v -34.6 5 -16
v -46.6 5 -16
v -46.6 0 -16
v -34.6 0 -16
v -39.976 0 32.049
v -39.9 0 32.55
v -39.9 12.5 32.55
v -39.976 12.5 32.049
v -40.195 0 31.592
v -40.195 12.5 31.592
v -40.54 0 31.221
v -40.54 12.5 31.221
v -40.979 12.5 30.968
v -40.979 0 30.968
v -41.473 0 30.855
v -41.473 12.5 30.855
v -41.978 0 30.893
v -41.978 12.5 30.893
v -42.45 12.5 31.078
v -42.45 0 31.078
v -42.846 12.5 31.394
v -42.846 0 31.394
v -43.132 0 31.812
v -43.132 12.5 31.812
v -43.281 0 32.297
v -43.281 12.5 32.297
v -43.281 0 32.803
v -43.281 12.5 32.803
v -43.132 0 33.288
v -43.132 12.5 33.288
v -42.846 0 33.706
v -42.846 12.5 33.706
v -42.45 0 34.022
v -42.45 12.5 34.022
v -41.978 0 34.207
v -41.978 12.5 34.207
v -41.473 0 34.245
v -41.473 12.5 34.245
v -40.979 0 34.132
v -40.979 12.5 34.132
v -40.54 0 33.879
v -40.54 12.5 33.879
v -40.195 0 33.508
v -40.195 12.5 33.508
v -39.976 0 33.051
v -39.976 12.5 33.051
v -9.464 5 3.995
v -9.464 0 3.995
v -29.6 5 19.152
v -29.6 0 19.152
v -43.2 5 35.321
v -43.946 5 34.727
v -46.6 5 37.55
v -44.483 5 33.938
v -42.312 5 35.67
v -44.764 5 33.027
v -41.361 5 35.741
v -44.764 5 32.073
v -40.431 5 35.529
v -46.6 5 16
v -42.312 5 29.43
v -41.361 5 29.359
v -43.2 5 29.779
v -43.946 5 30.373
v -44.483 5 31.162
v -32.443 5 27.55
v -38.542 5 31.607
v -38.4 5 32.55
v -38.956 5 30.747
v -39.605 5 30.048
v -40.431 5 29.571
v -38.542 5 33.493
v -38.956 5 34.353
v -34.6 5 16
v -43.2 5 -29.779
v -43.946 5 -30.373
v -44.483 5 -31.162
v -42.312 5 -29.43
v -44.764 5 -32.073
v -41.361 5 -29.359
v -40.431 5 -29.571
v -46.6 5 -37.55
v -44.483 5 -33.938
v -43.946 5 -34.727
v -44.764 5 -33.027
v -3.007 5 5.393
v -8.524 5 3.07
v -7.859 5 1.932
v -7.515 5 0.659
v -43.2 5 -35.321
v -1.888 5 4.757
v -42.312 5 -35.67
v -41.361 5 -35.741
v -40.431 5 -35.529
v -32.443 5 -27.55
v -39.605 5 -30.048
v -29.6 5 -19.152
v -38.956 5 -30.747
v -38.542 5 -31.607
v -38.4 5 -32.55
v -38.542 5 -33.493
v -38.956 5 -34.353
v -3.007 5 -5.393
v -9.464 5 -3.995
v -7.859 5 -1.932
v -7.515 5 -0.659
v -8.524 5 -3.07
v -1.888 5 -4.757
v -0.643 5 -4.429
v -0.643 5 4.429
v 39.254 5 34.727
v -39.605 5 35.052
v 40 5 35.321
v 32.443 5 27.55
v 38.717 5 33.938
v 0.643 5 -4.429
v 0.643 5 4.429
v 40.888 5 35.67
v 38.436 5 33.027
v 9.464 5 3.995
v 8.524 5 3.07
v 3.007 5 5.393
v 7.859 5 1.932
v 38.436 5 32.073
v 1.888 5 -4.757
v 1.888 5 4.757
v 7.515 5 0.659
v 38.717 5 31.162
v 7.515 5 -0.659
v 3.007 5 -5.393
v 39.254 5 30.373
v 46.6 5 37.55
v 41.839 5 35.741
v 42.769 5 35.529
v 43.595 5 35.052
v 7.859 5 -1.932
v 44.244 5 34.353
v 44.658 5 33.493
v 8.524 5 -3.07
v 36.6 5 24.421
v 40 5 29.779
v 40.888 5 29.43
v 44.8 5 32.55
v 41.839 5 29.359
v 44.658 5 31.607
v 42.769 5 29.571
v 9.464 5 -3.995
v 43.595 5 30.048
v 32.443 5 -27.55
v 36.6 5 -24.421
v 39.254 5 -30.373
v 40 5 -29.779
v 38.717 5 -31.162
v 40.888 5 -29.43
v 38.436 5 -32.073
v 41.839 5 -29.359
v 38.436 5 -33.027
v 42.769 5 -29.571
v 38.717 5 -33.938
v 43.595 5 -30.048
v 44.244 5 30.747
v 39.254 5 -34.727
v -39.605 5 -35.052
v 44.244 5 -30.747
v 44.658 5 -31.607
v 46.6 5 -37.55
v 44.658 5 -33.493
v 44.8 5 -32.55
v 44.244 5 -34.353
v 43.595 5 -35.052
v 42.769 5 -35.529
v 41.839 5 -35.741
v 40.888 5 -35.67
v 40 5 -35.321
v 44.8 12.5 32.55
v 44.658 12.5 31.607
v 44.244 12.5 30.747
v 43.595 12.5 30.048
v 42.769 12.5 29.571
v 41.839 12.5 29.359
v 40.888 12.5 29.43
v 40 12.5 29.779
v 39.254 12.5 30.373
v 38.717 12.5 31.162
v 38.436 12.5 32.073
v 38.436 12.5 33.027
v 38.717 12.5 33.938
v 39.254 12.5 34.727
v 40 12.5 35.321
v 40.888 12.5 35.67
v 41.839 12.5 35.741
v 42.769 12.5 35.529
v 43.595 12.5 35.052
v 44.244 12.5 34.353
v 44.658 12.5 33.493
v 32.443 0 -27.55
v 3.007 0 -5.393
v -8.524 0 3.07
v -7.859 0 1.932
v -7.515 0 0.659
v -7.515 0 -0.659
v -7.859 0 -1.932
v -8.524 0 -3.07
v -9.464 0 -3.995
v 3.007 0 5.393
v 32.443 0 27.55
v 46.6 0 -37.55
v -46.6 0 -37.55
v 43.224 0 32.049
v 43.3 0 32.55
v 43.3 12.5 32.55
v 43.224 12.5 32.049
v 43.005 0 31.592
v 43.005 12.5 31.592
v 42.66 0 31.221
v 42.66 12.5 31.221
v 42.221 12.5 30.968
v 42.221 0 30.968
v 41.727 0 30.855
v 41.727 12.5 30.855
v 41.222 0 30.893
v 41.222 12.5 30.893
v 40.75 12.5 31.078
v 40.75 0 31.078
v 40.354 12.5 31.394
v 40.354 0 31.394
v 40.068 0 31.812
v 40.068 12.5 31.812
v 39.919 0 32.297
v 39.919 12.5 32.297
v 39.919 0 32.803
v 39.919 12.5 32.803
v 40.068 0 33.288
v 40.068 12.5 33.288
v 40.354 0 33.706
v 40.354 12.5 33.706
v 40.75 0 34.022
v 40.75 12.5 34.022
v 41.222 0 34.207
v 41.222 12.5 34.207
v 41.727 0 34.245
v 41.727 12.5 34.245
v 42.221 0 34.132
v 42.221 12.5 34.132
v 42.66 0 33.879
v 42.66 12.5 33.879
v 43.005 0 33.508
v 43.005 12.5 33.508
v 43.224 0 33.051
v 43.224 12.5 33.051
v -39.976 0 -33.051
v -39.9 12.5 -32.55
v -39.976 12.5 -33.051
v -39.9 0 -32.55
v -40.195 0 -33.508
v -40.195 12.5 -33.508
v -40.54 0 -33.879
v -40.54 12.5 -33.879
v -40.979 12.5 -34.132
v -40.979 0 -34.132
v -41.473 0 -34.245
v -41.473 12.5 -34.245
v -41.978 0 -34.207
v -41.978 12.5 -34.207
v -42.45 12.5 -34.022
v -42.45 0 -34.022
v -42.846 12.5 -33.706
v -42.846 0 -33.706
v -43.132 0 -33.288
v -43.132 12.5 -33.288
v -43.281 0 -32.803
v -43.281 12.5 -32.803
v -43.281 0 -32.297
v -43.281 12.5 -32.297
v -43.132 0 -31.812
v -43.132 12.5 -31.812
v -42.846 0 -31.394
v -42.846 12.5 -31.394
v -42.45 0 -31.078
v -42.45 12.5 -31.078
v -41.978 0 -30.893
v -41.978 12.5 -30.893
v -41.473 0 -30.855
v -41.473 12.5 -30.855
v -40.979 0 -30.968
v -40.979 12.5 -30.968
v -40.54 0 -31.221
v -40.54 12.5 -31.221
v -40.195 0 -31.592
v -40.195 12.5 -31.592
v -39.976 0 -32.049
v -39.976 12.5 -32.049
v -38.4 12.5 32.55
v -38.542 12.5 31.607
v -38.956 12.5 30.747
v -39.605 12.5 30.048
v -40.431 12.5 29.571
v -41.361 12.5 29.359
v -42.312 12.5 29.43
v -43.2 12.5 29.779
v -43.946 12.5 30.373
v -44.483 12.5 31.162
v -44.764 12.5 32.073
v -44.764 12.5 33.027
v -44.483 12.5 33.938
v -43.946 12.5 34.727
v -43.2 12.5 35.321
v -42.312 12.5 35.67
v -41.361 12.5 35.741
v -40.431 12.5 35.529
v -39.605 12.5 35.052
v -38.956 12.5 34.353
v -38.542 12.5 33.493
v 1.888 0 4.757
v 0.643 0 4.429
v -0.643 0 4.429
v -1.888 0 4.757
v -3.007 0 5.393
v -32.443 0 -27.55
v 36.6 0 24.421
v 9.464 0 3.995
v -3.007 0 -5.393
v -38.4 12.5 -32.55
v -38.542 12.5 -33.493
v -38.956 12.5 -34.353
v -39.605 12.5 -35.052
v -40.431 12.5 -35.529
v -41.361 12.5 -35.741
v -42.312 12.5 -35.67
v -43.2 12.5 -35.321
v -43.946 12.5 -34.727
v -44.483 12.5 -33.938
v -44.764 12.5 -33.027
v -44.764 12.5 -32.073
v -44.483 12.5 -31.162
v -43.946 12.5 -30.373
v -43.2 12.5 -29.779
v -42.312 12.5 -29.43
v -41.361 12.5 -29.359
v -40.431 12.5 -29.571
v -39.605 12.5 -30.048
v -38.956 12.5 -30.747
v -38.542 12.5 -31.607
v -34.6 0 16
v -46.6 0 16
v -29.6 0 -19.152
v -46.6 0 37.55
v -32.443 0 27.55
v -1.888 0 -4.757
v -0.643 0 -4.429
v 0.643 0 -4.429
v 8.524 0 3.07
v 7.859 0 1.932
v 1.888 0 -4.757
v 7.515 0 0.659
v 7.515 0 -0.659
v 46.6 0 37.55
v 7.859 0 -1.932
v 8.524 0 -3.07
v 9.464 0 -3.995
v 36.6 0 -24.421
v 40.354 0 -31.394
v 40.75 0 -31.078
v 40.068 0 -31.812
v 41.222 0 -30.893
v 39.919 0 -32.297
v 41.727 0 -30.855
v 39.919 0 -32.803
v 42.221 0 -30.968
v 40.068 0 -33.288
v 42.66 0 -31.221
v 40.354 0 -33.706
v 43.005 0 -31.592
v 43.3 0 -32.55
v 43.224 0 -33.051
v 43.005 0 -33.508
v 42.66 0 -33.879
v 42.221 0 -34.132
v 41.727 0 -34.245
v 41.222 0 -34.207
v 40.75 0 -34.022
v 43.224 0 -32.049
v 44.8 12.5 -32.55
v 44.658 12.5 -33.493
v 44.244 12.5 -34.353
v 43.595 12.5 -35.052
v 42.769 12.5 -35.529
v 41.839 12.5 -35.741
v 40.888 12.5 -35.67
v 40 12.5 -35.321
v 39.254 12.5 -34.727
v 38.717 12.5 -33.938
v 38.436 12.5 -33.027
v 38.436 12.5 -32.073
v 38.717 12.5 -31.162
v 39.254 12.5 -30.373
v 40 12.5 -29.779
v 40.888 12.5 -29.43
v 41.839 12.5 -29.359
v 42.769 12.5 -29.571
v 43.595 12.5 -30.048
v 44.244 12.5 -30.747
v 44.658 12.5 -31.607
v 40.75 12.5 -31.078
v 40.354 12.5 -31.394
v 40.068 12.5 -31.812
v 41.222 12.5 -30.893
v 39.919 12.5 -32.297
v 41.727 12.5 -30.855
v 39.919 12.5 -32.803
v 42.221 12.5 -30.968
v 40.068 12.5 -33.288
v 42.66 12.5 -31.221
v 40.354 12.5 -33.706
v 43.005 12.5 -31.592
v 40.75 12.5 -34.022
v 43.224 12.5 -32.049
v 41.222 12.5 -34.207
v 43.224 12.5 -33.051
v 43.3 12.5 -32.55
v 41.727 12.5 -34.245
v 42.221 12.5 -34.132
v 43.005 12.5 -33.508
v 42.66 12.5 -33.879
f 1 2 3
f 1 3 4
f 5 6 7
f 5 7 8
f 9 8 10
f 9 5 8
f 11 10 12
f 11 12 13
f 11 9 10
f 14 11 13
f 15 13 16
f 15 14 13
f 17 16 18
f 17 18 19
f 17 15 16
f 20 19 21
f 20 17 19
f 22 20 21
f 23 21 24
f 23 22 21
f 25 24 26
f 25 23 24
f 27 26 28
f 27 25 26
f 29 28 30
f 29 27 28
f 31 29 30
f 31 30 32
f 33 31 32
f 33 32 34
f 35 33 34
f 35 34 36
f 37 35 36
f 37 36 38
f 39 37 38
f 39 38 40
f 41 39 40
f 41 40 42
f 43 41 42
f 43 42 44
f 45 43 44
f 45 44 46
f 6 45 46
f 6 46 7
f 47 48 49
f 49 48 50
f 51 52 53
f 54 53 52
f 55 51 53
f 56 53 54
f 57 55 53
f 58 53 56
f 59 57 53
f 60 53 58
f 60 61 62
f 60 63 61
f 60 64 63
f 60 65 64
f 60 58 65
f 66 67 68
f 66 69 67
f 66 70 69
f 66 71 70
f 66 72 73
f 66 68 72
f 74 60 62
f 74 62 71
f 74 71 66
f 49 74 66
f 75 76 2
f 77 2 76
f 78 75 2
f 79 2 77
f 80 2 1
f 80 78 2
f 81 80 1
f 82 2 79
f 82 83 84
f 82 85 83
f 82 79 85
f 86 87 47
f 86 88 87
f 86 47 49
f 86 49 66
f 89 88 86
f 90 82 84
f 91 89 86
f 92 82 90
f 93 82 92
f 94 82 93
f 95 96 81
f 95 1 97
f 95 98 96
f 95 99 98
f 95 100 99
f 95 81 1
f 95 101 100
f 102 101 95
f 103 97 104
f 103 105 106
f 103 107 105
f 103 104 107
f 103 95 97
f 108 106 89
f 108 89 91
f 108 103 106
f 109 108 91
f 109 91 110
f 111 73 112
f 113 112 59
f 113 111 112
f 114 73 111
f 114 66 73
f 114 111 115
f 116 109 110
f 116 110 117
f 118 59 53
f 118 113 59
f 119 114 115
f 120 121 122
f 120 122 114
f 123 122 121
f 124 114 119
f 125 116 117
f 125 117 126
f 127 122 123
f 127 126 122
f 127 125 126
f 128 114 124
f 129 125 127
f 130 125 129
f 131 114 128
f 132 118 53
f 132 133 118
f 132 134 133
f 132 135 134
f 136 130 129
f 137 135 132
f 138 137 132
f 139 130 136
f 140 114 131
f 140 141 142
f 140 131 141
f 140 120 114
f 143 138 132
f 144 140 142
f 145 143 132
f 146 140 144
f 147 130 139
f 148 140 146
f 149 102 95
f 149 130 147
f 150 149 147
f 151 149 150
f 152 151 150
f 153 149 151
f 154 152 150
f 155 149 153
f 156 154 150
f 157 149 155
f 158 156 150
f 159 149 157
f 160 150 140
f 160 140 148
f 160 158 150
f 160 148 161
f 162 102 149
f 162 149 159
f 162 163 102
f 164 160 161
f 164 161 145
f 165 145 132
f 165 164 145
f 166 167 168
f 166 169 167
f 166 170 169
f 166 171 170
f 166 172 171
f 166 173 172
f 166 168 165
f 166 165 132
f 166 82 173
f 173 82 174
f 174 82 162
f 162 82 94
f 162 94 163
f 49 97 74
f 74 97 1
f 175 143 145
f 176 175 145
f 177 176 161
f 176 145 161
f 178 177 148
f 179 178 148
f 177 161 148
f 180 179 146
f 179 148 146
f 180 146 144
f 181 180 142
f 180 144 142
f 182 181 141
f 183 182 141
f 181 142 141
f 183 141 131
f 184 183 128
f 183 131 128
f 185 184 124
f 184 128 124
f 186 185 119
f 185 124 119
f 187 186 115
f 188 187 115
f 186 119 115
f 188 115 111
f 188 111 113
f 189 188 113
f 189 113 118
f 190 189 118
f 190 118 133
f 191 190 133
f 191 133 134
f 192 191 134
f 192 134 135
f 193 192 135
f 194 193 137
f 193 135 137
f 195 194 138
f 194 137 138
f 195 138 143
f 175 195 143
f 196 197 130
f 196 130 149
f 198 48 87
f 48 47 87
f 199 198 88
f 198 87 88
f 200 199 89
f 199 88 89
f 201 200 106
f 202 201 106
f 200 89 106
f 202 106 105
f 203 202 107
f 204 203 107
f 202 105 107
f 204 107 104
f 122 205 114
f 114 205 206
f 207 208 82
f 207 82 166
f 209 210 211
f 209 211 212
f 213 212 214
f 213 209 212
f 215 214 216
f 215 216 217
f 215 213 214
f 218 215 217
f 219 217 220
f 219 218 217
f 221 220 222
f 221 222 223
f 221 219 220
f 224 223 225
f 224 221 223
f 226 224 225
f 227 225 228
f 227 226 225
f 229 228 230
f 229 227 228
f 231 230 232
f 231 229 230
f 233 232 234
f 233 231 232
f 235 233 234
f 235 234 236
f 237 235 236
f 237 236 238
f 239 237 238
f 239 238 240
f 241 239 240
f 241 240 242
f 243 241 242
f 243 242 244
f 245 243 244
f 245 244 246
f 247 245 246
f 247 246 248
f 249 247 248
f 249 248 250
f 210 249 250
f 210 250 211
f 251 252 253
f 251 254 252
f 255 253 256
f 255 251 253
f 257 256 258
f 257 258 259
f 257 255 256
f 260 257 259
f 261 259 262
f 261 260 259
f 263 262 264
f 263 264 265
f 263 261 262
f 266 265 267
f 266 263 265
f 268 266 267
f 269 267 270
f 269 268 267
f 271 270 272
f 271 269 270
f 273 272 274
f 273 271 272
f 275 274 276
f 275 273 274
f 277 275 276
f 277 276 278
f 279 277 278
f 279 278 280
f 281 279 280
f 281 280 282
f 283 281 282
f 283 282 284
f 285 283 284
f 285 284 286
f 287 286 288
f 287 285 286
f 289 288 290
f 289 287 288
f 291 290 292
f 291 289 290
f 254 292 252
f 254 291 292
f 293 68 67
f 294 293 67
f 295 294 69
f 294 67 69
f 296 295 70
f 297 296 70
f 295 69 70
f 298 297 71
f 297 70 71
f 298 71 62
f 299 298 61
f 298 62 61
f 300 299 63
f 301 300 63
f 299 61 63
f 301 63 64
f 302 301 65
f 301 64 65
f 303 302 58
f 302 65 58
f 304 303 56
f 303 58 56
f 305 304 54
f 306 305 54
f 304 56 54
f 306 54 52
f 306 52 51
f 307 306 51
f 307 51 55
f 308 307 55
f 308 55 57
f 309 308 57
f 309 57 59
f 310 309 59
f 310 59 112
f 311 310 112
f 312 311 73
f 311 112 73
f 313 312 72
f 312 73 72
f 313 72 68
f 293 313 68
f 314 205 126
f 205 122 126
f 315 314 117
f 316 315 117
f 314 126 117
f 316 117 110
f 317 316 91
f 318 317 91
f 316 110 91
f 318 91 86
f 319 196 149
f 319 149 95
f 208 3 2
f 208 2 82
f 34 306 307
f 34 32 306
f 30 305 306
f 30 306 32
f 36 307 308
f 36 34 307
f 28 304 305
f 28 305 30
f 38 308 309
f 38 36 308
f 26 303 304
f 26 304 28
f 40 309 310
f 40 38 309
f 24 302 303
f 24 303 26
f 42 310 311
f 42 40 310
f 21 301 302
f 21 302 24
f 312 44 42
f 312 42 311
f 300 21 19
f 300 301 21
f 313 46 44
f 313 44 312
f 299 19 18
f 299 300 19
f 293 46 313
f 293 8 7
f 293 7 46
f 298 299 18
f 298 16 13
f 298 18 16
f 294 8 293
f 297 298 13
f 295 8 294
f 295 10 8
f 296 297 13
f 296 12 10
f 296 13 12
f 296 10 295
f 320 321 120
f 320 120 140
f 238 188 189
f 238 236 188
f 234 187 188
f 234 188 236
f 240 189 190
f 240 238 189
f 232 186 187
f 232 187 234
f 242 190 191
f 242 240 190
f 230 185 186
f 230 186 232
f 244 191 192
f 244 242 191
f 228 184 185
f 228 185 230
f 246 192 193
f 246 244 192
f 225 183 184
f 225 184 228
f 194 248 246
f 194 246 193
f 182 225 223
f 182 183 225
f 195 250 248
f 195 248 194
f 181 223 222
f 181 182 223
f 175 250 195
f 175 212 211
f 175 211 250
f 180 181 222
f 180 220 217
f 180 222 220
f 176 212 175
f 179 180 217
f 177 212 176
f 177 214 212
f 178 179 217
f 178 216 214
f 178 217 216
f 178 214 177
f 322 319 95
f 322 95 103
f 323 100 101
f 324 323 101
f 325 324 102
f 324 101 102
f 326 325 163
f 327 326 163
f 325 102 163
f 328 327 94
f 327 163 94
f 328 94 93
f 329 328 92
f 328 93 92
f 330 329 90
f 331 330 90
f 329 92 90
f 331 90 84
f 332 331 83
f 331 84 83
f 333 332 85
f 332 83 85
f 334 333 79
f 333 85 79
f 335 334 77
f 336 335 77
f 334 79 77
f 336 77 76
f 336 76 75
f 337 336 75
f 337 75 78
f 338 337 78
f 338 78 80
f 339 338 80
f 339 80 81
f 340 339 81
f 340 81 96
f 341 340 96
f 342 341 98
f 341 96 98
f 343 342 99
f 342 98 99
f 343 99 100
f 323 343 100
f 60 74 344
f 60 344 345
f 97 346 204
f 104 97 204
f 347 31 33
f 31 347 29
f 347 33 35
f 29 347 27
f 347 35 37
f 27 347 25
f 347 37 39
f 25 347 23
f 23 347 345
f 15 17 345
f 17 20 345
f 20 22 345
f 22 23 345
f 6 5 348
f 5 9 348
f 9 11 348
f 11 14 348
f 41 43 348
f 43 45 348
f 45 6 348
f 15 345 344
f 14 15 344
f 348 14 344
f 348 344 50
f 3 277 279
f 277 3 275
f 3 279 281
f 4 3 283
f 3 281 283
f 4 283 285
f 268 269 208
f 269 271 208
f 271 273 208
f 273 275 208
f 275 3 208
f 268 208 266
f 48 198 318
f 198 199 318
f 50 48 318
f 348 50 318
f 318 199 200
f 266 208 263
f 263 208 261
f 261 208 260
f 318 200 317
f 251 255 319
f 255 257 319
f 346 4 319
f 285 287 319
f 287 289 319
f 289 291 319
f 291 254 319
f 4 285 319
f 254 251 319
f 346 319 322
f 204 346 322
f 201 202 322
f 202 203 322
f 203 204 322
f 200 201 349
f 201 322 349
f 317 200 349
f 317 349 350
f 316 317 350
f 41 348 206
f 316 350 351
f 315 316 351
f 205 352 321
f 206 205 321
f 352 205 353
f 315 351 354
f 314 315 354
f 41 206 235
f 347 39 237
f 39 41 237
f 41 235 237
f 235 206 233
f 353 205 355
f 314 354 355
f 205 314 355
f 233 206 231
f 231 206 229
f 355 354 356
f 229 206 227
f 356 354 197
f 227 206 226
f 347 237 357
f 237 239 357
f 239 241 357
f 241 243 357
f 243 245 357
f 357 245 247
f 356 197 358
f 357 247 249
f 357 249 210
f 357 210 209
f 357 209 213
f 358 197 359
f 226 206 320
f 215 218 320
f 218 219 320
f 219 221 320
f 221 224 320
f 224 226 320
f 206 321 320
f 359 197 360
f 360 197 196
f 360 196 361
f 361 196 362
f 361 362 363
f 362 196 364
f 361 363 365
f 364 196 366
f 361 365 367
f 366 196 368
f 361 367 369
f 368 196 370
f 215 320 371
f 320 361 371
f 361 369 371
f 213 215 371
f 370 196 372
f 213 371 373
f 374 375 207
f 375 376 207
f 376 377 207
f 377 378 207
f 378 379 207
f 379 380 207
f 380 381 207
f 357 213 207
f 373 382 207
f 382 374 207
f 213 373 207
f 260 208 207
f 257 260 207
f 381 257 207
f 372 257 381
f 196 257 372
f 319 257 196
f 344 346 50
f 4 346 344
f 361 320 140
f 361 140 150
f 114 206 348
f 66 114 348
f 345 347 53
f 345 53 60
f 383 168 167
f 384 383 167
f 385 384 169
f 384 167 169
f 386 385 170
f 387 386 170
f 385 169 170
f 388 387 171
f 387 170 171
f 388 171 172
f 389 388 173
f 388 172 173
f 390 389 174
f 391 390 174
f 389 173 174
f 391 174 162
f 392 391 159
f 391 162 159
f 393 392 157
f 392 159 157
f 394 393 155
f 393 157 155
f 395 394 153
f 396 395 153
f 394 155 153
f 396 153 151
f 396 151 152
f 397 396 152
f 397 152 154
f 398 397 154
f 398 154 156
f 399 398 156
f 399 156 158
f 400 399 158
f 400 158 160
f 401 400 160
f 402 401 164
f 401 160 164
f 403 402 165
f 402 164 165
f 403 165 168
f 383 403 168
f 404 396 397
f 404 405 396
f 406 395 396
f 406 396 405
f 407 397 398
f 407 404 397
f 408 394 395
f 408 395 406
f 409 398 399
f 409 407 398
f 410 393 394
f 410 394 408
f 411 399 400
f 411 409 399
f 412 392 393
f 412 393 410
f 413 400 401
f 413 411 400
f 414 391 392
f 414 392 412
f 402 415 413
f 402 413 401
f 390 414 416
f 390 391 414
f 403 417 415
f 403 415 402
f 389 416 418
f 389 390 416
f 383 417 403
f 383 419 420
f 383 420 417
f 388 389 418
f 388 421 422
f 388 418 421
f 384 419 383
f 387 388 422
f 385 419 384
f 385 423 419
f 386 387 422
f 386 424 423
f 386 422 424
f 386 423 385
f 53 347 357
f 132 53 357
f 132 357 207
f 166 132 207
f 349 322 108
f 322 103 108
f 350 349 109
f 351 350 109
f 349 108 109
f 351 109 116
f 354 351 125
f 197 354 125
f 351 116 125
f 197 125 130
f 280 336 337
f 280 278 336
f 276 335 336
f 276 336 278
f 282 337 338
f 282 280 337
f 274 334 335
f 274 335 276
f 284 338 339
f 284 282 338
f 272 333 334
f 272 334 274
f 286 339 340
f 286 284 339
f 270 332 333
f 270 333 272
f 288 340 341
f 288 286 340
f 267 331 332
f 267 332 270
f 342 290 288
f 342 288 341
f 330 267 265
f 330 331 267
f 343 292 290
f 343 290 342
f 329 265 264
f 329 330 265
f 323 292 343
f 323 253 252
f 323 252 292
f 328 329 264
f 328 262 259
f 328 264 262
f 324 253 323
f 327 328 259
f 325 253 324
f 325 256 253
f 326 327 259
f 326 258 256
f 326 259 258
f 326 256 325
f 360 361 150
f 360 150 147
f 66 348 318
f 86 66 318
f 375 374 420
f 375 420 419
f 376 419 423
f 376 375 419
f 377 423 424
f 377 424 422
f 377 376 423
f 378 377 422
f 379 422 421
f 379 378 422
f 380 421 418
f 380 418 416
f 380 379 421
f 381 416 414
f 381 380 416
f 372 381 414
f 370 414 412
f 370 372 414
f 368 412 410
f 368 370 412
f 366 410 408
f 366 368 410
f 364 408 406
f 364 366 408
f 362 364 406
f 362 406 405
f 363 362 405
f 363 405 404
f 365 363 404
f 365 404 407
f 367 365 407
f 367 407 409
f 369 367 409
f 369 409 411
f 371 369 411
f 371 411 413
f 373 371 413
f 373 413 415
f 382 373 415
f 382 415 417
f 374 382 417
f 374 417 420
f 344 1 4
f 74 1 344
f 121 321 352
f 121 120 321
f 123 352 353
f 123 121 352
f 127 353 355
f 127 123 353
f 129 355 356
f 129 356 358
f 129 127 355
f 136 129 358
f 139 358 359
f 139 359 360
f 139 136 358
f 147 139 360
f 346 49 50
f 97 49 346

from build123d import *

# Parameters (mm, degrees)
SKETCH2_W           = 93.2
SKETCH2_H           = 75.1
SKETCH2_R           = 1.7
BOSS_EXTRUDE2_DEPTH = 5
FILLET1_R           = 5
SKETCH4_R           = 3.2
SKETCH4_R_2         = 1.7
BOSS_EXTRUDE3_DEPTH = 7.5
SKETCH6_W           = 10
SKETCH6_H           = 32
CUT_EXTRUDE1_DEPTH  = 6
BOSS_EXTRUDE4_DEPTH = 5


with BuildPart() as part:
    # Sketch2 → Boss-Extrude2 (new body)
    with BuildSketch(Plane(origin=(0, 0, 0), x_dir=(1, 0, 0), z_dir=(0, 1, 0))):
        Rectangle(SKETCH2_W, SKETCH2_H)
        with Locations((-41.6, 32.55)):
            Circle(SKETCH2_R, mode=Mode.SUBTRACT)
        with Locations((41.6, 32.55)):
            Circle(SKETCH2_R, mode=Mode.SUBTRACT)
        with Locations((41.6, -32.55)):
            Circle(SKETCH2_R, mode=Mode.SUBTRACT)
        with Locations((-41.6, -32.55)):
            Circle(SKETCH2_R, mode=Mode.SUBTRACT)
        Polygon((-36.6, -24.420896868), (-36.6, 24.420896868), (-4.156993635, 0), align=None, mode=Mode.SUBTRACT)
        Polygon((36.6, -24.420896868), (36.6, 24.420896868), (4.156993635, 0), align=None, mode=Mode.SUBTRACT)
        Polygon((32.443006365, -27.55), (-32.443006365, -27.55), (0, -3.129103132), align=None, mode=Mode.SUBTRACT)
        Polygon((-32.443006365, 27.55), (0, 3.129103132), (32.443006365, 27.55), align=None, mode=Mode.SUBTRACT)
    extrude(amount=BOSS_EXTRUDE2_DEPTH)

    # Fillet1
    fillet1_edges = [part.edges().sort_by_distance(p)[0] for p in [
        (0, 2.5, 3.129103132),
        (-4.156993635, 2.5, 0),
        (4.156993635, 2.5, 0),
        (0, 2.5, -3.129103132),
    ]]
    fillet(fillet1_edges, radius=FILLET1_R)

    # Sketch4 → Boss-Extrude3 (add)
    with BuildSketch(Plane(origin=(0, 5, 0), x_dir=(1, 0, 0), z_dir=(0, 1, 0))):
        with Locations((-41.6, 32.55)):
            Circle(SKETCH4_R)
        with Locations((-41.6, 32.55)):
            Circle(SKETCH4_R_2, mode=Mode.SUBTRACT)
        with Locations((41.6, 32.55)):
            Circle(SKETCH4_R)
        with Locations((41.6, 32.55)):
            Circle(SKETCH4_R_2, mode=Mode.SUBTRACT)
        with Locations((-41.6, -32.55)):
            Circle(SKETCH4_R)
        with Locations((-41.6, -32.55)):
            Circle(SKETCH4_R_2, mode=Mode.SUBTRACT)
        with Locations((41.6, -32.55)):
            Circle(SKETCH4_R)
        with Locations((41.6, -32.55)):
            Circle(SKETCH4_R_2, mode=Mode.SUBTRACT)
    extrude(amount=BOSS_EXTRUDE3_DEPTH)

    # Sketch6 → Cut-Extrude1 (cut, through all)
    with BuildSketch(Plane(origin=(0, 5, 0), x_dir=(1, 0, 0), z_dir=(0, 1, 0))):
        with Locations((-41.6, 0)):
            Rectangle(SKETCH6_W, SKETCH6_H)
    extrude(amount=-CUT_EXTRUDE1_DEPTH, mode=Mode.SUBTRACT)

    # Sketch7 → Boss-Extrude4 (add)
    with BuildSketch(Plane(origin=(0, 5, 0), x_dir=(1, 0, 0), z_dir=(0, 1, 0))):
        Polygon((-36.6, 16), (-34.6, 16), (-34.6, -16), (-36.6, -16), (-36.6, -24.420896868), (-29.6, -19.151771185), (-29.6, 19.151771185), (-36.6, 24.420896868), align=None)
    extrude(amount=-BOSS_EXTRUDE4_DEPTH)


solid = part.part
